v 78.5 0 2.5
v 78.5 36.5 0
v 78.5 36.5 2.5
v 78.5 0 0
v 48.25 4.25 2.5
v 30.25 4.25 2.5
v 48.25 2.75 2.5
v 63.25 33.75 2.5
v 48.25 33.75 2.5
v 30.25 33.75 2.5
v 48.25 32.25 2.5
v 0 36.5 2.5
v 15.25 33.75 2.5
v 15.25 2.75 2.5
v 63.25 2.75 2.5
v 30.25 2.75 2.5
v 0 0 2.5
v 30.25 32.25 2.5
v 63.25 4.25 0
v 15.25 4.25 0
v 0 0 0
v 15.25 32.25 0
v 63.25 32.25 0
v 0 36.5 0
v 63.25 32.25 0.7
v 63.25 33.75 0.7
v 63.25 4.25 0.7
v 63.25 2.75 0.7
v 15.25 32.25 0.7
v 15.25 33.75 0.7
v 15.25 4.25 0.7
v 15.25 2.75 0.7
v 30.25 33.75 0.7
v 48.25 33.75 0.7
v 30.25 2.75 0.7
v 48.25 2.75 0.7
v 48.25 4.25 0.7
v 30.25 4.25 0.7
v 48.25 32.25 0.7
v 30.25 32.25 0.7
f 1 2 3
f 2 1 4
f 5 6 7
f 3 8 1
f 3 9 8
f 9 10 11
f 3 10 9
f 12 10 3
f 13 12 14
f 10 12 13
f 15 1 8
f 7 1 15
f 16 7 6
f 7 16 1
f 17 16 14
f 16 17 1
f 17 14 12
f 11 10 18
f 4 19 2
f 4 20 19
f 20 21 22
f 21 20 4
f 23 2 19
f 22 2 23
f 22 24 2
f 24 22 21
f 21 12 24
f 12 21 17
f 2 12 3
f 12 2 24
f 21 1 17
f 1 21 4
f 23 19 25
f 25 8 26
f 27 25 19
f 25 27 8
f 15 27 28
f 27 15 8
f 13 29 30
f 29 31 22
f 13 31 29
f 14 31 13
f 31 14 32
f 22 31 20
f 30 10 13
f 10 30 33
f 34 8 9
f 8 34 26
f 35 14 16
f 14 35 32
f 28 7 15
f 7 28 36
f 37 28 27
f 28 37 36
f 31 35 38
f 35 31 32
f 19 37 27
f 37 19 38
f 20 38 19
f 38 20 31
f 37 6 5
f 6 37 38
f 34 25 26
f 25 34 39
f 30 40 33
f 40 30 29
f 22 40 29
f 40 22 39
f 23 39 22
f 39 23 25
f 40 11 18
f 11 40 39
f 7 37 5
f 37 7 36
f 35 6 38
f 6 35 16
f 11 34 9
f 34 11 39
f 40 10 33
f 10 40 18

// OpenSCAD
/* Mounting Plate for IEC320 Fused Socket with Switch (Jaycar Prod Number PP4003
http://www.jaycar.com.au/productView.asp?ID=PP4003)
Created by David Bainbridge
4th November 2014

Creative Commons License
This work is licensed under a Creative Commons Attribution-NonCommercial-ShareAlike 4.0 International License.



*/

//78.5x31.5x2.5

socket_ext_length = 50;
socket_ext_height = 31;

socket_int_length = 48;
socket_int_height = 28;

plate_length = 78.5;//socket_int_length + 20;
plate_height = 36.5;//socket_int_height + 20;
plate_depth = 2.5;

socket_clip_depth = 0.7;
socket_clip_height = (socket_ext_height-socket_int_height)/2;
socket_clip_cutout_depth = plate_depth - socket_clip_depth;

support_length = 18;


transpoint = [(plate_length-socket_int_length)/2, (plate_height-socket_ext_height)/2,0];


module plate() {
	cube([plate_length, plate_height, plate_depth]);
}

module opening() {
	cube([socket_int_length, socket_ext_height, plate_depth]);
}

module clip() {
	cube([socket_int_length, socket_clip_height, socket_clip_depth]);
}





difference() {
	plate();
	translate(transpoint) opening();

}

translate(transpoint) clip();
translate(transpoint + [0,socket_ext_height-socket_clip_height,0]) clip();

translate(transpoint + [(socket_int_length-support_length)/2, 0, socket_clip_depth]) cube([support_length, socket_clip_height, socket_clip_cutout_depth]);

translate(transpoint + [(socket_int_length-support_length)/2, socket_ext_height-socket_clip_height, socket_clip_depth]) cube([support_length, socket_clip_height, socket_clip_cutout_depth]);
